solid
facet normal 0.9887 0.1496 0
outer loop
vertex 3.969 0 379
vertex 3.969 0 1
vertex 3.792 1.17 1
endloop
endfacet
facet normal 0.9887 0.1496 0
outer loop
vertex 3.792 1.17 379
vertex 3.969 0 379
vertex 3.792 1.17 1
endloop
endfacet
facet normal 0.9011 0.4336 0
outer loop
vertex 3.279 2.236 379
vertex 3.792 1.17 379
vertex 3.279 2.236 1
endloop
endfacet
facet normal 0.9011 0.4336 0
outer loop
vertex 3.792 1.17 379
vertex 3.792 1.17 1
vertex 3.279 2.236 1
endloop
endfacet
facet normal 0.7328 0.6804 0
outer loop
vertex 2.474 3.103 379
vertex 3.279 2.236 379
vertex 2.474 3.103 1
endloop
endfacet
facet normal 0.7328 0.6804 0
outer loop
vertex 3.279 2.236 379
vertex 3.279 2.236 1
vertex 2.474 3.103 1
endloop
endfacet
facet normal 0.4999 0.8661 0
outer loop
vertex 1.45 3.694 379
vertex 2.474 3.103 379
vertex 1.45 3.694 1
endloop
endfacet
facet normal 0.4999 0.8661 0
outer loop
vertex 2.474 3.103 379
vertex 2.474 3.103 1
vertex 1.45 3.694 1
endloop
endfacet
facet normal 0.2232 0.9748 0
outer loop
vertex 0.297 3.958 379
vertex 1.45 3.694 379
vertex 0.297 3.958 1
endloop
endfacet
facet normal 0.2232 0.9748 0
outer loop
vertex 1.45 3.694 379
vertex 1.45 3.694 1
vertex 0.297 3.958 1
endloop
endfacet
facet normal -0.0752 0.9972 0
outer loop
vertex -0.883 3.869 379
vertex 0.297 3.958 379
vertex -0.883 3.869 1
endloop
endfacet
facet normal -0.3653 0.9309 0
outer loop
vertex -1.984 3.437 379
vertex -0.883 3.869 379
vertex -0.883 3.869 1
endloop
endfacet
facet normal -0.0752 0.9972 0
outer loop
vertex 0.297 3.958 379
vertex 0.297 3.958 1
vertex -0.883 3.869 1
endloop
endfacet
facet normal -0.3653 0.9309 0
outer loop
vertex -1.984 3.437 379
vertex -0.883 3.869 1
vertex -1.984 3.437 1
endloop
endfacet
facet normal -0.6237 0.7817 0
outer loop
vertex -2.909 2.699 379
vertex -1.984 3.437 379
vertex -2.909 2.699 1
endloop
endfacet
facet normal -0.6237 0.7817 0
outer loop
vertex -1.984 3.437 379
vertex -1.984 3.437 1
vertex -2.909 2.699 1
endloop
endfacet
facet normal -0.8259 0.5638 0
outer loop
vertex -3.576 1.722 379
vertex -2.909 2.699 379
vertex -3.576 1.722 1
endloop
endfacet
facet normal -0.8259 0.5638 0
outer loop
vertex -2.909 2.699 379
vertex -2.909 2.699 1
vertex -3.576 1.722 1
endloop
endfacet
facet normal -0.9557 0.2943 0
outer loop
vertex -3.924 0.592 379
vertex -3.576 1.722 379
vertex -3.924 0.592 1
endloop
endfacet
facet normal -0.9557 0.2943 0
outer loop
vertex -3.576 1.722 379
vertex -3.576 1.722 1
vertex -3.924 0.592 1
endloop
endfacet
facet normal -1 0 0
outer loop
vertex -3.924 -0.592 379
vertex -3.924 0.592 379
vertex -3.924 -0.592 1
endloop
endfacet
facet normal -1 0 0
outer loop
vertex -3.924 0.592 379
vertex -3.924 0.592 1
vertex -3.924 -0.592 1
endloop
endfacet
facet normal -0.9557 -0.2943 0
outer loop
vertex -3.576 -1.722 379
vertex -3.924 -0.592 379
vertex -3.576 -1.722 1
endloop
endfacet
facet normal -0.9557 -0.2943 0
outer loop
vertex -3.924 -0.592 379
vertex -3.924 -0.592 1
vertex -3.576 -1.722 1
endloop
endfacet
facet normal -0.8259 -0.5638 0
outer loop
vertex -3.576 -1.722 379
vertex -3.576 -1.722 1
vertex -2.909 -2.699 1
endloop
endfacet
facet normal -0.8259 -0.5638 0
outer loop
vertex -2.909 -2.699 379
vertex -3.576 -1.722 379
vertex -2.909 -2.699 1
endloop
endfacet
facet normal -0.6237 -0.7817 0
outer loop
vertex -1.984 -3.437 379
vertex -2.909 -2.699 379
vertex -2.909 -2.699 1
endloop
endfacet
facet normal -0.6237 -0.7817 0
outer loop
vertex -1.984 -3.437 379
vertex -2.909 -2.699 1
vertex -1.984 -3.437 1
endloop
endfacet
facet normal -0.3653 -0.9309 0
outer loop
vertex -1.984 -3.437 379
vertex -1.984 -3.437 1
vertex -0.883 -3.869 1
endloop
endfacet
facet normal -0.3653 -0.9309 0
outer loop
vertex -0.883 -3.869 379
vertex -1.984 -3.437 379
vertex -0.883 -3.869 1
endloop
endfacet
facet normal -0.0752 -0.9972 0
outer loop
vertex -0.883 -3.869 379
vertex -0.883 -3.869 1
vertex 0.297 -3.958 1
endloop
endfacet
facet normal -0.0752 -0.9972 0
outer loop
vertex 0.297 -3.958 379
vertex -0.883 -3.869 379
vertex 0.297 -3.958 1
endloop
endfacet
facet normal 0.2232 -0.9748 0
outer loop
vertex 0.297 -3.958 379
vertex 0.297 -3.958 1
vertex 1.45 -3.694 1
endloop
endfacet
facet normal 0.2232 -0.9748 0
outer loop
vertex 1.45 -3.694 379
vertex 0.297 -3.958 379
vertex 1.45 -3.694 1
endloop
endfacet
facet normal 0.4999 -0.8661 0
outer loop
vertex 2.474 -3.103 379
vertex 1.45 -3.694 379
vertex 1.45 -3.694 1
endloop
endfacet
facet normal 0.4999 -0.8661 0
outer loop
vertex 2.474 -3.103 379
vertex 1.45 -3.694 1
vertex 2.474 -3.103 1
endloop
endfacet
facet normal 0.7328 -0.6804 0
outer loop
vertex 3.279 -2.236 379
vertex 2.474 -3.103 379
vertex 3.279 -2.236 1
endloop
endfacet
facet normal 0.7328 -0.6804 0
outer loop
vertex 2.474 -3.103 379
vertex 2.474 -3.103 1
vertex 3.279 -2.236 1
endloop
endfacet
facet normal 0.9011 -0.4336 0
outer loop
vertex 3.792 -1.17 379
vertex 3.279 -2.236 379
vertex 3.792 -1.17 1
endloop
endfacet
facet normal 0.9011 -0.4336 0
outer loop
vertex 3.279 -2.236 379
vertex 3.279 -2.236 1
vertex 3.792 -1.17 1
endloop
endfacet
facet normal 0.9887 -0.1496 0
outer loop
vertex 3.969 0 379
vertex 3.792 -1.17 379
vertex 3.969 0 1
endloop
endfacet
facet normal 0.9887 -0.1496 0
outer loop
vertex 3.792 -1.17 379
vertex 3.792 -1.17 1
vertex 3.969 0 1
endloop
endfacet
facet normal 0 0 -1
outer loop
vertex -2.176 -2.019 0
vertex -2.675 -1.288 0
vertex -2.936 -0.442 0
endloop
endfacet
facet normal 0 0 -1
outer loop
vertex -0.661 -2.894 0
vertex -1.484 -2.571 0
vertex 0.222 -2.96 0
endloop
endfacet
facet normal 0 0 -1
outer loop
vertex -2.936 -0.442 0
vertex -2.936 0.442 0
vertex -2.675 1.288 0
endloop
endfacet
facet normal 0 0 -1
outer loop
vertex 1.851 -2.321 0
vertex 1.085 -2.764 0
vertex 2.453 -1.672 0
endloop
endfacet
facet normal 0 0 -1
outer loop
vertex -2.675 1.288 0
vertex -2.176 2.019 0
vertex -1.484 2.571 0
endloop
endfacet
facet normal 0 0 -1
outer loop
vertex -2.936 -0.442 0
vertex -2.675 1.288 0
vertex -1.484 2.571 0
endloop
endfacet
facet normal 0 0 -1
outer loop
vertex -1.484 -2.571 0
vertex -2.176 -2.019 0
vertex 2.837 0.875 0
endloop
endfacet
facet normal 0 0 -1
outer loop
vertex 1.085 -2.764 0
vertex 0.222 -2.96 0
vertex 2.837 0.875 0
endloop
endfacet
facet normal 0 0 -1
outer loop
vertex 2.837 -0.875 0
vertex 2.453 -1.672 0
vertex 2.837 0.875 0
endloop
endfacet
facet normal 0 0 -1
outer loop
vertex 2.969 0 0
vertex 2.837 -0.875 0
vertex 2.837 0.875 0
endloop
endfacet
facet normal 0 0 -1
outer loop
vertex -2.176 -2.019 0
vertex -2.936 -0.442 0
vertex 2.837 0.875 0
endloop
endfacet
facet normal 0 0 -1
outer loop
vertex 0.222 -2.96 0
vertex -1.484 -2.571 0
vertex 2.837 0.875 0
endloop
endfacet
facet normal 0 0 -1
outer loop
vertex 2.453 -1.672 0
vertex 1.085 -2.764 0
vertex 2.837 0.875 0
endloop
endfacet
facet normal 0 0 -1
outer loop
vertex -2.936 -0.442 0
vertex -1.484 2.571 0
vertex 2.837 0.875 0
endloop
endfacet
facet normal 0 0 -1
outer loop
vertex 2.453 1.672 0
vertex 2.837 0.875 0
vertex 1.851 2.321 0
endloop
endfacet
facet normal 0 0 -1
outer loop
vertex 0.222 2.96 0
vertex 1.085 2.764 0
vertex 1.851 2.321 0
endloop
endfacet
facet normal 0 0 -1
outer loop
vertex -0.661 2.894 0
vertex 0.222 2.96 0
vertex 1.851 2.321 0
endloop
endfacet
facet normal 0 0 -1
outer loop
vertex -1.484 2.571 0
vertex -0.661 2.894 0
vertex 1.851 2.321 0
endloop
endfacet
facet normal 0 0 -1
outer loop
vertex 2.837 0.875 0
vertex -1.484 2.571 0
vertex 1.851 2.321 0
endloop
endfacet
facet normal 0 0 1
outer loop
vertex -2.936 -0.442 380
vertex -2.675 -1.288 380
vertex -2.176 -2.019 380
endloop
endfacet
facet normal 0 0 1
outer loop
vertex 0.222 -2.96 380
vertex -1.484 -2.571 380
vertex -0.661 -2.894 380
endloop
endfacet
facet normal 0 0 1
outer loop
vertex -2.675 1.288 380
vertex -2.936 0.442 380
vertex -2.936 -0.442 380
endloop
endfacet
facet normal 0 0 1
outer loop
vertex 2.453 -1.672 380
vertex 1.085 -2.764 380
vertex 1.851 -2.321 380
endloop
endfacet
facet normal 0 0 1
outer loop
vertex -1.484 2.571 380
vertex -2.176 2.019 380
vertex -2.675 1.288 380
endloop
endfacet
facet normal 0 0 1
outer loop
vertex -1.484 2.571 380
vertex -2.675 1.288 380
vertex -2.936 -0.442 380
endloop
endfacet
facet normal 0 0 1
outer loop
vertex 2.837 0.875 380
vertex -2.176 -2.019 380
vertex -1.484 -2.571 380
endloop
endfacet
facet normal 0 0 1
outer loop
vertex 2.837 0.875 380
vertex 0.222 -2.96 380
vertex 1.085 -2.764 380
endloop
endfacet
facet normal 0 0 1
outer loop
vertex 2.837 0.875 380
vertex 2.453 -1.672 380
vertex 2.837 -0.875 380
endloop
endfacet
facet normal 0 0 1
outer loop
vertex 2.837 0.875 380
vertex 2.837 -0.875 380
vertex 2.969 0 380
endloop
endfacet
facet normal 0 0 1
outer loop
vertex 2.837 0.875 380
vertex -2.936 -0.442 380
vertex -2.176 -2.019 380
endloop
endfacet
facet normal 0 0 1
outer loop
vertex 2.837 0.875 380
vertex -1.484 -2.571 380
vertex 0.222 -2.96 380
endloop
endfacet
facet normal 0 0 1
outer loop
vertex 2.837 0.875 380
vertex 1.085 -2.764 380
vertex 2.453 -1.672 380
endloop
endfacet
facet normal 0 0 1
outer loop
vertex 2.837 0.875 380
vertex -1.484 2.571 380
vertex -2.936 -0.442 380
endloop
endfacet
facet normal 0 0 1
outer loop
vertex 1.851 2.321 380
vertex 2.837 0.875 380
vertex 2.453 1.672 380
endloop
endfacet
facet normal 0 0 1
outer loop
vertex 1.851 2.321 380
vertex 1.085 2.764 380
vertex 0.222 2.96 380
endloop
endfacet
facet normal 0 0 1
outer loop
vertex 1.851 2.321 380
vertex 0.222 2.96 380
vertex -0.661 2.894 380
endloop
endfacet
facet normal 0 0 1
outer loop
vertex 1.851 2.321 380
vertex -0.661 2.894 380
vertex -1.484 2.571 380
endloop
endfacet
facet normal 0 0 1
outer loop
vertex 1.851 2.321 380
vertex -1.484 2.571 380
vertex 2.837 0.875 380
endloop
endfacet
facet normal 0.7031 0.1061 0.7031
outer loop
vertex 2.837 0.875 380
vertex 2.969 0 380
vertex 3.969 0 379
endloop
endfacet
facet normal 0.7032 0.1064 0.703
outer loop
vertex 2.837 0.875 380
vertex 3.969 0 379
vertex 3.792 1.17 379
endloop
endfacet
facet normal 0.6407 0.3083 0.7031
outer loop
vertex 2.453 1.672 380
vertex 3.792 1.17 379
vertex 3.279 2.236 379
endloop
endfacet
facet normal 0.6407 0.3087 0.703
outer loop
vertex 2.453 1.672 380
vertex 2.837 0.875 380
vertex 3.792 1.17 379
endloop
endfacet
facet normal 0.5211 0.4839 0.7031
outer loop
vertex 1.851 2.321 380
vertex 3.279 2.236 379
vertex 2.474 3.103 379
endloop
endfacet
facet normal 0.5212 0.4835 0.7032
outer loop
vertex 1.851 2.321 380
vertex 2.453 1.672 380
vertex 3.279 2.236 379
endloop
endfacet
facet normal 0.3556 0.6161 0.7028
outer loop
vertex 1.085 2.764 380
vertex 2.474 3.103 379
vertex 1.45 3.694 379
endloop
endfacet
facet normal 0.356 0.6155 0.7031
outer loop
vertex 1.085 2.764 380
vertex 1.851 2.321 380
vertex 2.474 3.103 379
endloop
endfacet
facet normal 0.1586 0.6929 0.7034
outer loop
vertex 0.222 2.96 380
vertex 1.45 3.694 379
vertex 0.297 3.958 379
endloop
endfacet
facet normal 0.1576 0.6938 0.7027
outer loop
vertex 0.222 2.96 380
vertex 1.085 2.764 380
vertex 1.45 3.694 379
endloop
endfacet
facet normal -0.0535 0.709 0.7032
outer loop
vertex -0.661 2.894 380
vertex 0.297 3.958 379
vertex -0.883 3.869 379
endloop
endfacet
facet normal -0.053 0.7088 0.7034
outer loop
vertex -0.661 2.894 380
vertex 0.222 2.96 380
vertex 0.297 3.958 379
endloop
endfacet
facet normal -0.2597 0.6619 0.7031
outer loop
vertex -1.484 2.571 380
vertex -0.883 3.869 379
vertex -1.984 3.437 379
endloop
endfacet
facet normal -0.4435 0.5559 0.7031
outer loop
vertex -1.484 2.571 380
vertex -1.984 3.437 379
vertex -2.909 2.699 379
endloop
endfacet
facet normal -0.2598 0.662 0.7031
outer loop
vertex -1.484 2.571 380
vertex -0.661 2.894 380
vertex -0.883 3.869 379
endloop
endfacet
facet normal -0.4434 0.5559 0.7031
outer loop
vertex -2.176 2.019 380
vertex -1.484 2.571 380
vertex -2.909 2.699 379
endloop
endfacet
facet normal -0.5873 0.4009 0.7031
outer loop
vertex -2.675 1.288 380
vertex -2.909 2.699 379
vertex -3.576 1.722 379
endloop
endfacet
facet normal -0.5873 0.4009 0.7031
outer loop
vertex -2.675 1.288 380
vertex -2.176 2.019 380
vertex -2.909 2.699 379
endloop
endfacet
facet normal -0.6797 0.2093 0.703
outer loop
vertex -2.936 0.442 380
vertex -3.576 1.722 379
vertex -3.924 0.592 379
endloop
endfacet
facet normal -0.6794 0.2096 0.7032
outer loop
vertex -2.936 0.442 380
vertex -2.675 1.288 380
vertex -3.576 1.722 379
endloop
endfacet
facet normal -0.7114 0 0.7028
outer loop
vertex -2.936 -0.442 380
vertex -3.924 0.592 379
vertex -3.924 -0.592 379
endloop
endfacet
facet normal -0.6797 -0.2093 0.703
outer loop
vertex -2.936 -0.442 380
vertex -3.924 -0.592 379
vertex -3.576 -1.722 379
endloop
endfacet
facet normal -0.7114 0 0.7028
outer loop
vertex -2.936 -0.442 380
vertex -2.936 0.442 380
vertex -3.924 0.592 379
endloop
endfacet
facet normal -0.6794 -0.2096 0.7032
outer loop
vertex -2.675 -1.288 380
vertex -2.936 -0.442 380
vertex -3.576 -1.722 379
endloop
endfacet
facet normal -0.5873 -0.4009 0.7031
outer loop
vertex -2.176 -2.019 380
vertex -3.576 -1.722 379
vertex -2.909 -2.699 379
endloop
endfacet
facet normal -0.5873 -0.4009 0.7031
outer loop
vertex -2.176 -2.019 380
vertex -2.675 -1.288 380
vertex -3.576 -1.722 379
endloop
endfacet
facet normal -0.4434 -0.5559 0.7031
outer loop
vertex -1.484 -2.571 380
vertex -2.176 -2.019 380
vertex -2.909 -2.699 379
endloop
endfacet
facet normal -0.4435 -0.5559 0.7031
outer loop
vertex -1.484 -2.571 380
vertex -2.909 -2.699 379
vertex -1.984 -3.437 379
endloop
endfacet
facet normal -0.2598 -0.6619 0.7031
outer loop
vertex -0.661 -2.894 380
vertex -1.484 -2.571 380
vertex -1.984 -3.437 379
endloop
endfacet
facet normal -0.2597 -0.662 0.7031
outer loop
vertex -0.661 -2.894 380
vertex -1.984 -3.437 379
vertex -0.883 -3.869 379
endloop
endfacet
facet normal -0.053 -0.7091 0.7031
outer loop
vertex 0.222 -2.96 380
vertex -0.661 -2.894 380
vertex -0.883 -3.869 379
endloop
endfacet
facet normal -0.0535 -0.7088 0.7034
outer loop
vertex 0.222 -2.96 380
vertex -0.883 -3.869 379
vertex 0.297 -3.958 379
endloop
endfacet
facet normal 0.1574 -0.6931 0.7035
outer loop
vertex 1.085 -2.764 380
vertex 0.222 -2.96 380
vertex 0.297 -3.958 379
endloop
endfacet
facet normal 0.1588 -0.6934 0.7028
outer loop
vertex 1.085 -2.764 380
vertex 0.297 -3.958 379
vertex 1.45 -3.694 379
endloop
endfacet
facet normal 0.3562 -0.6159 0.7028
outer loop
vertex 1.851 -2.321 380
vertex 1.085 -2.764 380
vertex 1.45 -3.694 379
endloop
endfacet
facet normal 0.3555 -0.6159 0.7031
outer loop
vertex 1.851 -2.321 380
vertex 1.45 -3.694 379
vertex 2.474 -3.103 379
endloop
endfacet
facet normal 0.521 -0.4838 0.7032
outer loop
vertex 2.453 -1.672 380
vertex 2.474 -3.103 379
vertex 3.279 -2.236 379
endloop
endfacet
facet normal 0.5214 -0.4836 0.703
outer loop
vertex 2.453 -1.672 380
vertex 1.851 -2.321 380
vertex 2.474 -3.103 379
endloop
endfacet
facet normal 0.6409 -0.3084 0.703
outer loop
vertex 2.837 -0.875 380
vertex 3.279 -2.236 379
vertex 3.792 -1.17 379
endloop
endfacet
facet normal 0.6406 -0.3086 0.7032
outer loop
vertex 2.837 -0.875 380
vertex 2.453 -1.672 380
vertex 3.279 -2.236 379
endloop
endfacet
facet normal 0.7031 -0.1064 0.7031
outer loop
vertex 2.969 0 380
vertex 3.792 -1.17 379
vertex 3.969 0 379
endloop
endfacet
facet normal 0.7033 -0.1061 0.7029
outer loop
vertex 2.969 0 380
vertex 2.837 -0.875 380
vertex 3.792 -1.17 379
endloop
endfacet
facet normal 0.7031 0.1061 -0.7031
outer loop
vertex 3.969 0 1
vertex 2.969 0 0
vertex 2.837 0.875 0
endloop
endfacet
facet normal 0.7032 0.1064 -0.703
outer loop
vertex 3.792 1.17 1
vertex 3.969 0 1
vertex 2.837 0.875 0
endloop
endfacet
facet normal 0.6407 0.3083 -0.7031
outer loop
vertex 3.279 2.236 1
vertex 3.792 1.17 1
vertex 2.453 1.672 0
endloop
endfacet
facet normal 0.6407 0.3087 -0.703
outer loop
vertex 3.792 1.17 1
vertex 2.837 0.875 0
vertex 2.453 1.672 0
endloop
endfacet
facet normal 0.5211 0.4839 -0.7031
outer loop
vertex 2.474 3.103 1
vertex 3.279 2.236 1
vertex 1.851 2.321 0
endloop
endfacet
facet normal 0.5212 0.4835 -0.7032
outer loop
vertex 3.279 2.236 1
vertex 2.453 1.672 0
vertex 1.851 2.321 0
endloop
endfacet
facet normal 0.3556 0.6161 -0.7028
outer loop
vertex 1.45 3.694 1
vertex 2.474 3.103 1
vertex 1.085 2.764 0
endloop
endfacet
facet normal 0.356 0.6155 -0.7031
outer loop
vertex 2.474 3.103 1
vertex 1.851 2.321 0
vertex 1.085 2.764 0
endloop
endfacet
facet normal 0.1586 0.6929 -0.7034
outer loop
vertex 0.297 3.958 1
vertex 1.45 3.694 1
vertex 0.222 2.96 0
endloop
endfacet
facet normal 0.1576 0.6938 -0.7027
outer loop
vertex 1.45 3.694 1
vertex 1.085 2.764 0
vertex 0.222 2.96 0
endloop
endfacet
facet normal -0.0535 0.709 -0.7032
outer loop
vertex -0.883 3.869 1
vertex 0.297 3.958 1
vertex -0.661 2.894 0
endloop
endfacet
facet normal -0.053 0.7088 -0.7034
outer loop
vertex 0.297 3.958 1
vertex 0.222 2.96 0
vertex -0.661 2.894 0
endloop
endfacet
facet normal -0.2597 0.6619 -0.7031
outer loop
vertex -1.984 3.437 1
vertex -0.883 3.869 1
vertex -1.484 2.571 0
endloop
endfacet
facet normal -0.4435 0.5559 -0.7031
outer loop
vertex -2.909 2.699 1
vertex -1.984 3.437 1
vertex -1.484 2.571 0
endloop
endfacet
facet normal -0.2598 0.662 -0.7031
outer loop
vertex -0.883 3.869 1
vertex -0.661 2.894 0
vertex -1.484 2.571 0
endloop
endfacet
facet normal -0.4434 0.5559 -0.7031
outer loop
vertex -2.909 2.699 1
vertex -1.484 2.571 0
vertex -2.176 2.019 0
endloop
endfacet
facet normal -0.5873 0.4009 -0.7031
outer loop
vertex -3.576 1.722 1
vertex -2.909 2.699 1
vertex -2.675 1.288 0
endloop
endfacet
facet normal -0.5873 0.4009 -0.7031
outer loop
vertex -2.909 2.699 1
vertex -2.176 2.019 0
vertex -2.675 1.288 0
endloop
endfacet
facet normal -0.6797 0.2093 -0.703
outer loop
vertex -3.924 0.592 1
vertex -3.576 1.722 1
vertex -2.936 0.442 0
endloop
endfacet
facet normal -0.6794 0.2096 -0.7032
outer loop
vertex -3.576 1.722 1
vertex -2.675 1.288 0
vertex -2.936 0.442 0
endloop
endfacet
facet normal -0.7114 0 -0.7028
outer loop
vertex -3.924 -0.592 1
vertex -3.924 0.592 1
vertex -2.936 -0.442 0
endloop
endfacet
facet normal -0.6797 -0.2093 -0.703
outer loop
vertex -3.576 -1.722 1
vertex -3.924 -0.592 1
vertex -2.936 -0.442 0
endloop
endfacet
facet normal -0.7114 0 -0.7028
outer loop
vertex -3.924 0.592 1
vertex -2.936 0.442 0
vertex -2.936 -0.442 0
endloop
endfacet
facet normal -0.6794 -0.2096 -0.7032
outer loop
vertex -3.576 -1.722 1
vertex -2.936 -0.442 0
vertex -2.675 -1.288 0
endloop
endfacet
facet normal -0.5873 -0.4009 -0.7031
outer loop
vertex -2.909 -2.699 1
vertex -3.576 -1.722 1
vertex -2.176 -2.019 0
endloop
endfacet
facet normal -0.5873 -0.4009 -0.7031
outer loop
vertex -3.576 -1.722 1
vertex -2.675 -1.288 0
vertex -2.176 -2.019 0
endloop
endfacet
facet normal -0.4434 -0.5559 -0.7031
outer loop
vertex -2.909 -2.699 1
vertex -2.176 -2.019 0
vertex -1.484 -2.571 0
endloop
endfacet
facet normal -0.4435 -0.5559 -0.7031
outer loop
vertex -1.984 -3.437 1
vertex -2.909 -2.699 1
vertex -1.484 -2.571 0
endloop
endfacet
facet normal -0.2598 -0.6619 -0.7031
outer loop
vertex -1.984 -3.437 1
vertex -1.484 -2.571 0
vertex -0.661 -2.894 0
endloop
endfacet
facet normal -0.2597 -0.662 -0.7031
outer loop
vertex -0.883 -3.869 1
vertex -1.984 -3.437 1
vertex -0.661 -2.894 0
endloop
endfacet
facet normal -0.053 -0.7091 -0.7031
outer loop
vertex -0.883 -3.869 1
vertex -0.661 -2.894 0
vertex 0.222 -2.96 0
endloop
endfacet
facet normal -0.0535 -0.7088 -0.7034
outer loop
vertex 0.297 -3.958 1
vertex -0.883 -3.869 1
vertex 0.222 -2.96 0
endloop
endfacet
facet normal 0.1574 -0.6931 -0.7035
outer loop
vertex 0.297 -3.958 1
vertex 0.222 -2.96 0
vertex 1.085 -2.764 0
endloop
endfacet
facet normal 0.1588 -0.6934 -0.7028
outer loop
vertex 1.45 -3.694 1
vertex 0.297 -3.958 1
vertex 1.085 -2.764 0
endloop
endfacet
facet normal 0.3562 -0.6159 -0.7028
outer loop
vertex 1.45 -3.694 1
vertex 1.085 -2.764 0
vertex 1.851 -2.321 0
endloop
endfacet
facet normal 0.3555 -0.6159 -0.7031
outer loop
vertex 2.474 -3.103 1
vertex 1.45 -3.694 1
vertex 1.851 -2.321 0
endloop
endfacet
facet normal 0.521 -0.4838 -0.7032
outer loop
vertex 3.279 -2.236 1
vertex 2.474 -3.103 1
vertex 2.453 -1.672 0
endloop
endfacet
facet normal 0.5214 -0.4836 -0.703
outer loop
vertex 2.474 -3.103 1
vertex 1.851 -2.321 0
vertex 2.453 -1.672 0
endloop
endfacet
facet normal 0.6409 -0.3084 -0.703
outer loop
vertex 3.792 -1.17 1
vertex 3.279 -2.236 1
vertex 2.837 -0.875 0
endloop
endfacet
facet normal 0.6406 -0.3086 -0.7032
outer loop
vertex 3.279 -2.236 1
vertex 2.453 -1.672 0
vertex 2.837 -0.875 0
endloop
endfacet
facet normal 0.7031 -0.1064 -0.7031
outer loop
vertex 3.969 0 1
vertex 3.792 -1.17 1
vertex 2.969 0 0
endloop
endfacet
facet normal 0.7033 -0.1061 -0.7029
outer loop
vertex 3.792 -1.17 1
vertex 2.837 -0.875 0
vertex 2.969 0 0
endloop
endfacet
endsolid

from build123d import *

# Parameters (mm, degrees)
SKETCH1_R           = 3.96875
BOSS_EXTRUDE1_DEPTH = 380
CHAMFER2_SIZE       = 1
CHAMFER3_SIZE       = 1


with BuildPart() as part:
    # Sketch1 → Boss-Extrude1 (new body)
    with BuildSketch(Plane.XY):
        Circle(SKETCH1_R)
    extrude(amount=BOSS_EXTRUDE1_DEPTH)

    # Chamfer2
    chamfer2_edges = [part.edges().sort_by_distance(p)[0] for p in [
        (-3.96875, 0, 0),
    ]]
    chamfer(chamfer2_edges, length=CHAMFER2_SIZE)

    # Chamfer3
    chamfer3_edges = [part.edges().sort_by_distance(p)[0] for p in [
        (-3.96875, 0, 380),
    ]]
    chamfer(chamfer3_edges, length=CHAMFER3_SIZE)


solid = part.part
